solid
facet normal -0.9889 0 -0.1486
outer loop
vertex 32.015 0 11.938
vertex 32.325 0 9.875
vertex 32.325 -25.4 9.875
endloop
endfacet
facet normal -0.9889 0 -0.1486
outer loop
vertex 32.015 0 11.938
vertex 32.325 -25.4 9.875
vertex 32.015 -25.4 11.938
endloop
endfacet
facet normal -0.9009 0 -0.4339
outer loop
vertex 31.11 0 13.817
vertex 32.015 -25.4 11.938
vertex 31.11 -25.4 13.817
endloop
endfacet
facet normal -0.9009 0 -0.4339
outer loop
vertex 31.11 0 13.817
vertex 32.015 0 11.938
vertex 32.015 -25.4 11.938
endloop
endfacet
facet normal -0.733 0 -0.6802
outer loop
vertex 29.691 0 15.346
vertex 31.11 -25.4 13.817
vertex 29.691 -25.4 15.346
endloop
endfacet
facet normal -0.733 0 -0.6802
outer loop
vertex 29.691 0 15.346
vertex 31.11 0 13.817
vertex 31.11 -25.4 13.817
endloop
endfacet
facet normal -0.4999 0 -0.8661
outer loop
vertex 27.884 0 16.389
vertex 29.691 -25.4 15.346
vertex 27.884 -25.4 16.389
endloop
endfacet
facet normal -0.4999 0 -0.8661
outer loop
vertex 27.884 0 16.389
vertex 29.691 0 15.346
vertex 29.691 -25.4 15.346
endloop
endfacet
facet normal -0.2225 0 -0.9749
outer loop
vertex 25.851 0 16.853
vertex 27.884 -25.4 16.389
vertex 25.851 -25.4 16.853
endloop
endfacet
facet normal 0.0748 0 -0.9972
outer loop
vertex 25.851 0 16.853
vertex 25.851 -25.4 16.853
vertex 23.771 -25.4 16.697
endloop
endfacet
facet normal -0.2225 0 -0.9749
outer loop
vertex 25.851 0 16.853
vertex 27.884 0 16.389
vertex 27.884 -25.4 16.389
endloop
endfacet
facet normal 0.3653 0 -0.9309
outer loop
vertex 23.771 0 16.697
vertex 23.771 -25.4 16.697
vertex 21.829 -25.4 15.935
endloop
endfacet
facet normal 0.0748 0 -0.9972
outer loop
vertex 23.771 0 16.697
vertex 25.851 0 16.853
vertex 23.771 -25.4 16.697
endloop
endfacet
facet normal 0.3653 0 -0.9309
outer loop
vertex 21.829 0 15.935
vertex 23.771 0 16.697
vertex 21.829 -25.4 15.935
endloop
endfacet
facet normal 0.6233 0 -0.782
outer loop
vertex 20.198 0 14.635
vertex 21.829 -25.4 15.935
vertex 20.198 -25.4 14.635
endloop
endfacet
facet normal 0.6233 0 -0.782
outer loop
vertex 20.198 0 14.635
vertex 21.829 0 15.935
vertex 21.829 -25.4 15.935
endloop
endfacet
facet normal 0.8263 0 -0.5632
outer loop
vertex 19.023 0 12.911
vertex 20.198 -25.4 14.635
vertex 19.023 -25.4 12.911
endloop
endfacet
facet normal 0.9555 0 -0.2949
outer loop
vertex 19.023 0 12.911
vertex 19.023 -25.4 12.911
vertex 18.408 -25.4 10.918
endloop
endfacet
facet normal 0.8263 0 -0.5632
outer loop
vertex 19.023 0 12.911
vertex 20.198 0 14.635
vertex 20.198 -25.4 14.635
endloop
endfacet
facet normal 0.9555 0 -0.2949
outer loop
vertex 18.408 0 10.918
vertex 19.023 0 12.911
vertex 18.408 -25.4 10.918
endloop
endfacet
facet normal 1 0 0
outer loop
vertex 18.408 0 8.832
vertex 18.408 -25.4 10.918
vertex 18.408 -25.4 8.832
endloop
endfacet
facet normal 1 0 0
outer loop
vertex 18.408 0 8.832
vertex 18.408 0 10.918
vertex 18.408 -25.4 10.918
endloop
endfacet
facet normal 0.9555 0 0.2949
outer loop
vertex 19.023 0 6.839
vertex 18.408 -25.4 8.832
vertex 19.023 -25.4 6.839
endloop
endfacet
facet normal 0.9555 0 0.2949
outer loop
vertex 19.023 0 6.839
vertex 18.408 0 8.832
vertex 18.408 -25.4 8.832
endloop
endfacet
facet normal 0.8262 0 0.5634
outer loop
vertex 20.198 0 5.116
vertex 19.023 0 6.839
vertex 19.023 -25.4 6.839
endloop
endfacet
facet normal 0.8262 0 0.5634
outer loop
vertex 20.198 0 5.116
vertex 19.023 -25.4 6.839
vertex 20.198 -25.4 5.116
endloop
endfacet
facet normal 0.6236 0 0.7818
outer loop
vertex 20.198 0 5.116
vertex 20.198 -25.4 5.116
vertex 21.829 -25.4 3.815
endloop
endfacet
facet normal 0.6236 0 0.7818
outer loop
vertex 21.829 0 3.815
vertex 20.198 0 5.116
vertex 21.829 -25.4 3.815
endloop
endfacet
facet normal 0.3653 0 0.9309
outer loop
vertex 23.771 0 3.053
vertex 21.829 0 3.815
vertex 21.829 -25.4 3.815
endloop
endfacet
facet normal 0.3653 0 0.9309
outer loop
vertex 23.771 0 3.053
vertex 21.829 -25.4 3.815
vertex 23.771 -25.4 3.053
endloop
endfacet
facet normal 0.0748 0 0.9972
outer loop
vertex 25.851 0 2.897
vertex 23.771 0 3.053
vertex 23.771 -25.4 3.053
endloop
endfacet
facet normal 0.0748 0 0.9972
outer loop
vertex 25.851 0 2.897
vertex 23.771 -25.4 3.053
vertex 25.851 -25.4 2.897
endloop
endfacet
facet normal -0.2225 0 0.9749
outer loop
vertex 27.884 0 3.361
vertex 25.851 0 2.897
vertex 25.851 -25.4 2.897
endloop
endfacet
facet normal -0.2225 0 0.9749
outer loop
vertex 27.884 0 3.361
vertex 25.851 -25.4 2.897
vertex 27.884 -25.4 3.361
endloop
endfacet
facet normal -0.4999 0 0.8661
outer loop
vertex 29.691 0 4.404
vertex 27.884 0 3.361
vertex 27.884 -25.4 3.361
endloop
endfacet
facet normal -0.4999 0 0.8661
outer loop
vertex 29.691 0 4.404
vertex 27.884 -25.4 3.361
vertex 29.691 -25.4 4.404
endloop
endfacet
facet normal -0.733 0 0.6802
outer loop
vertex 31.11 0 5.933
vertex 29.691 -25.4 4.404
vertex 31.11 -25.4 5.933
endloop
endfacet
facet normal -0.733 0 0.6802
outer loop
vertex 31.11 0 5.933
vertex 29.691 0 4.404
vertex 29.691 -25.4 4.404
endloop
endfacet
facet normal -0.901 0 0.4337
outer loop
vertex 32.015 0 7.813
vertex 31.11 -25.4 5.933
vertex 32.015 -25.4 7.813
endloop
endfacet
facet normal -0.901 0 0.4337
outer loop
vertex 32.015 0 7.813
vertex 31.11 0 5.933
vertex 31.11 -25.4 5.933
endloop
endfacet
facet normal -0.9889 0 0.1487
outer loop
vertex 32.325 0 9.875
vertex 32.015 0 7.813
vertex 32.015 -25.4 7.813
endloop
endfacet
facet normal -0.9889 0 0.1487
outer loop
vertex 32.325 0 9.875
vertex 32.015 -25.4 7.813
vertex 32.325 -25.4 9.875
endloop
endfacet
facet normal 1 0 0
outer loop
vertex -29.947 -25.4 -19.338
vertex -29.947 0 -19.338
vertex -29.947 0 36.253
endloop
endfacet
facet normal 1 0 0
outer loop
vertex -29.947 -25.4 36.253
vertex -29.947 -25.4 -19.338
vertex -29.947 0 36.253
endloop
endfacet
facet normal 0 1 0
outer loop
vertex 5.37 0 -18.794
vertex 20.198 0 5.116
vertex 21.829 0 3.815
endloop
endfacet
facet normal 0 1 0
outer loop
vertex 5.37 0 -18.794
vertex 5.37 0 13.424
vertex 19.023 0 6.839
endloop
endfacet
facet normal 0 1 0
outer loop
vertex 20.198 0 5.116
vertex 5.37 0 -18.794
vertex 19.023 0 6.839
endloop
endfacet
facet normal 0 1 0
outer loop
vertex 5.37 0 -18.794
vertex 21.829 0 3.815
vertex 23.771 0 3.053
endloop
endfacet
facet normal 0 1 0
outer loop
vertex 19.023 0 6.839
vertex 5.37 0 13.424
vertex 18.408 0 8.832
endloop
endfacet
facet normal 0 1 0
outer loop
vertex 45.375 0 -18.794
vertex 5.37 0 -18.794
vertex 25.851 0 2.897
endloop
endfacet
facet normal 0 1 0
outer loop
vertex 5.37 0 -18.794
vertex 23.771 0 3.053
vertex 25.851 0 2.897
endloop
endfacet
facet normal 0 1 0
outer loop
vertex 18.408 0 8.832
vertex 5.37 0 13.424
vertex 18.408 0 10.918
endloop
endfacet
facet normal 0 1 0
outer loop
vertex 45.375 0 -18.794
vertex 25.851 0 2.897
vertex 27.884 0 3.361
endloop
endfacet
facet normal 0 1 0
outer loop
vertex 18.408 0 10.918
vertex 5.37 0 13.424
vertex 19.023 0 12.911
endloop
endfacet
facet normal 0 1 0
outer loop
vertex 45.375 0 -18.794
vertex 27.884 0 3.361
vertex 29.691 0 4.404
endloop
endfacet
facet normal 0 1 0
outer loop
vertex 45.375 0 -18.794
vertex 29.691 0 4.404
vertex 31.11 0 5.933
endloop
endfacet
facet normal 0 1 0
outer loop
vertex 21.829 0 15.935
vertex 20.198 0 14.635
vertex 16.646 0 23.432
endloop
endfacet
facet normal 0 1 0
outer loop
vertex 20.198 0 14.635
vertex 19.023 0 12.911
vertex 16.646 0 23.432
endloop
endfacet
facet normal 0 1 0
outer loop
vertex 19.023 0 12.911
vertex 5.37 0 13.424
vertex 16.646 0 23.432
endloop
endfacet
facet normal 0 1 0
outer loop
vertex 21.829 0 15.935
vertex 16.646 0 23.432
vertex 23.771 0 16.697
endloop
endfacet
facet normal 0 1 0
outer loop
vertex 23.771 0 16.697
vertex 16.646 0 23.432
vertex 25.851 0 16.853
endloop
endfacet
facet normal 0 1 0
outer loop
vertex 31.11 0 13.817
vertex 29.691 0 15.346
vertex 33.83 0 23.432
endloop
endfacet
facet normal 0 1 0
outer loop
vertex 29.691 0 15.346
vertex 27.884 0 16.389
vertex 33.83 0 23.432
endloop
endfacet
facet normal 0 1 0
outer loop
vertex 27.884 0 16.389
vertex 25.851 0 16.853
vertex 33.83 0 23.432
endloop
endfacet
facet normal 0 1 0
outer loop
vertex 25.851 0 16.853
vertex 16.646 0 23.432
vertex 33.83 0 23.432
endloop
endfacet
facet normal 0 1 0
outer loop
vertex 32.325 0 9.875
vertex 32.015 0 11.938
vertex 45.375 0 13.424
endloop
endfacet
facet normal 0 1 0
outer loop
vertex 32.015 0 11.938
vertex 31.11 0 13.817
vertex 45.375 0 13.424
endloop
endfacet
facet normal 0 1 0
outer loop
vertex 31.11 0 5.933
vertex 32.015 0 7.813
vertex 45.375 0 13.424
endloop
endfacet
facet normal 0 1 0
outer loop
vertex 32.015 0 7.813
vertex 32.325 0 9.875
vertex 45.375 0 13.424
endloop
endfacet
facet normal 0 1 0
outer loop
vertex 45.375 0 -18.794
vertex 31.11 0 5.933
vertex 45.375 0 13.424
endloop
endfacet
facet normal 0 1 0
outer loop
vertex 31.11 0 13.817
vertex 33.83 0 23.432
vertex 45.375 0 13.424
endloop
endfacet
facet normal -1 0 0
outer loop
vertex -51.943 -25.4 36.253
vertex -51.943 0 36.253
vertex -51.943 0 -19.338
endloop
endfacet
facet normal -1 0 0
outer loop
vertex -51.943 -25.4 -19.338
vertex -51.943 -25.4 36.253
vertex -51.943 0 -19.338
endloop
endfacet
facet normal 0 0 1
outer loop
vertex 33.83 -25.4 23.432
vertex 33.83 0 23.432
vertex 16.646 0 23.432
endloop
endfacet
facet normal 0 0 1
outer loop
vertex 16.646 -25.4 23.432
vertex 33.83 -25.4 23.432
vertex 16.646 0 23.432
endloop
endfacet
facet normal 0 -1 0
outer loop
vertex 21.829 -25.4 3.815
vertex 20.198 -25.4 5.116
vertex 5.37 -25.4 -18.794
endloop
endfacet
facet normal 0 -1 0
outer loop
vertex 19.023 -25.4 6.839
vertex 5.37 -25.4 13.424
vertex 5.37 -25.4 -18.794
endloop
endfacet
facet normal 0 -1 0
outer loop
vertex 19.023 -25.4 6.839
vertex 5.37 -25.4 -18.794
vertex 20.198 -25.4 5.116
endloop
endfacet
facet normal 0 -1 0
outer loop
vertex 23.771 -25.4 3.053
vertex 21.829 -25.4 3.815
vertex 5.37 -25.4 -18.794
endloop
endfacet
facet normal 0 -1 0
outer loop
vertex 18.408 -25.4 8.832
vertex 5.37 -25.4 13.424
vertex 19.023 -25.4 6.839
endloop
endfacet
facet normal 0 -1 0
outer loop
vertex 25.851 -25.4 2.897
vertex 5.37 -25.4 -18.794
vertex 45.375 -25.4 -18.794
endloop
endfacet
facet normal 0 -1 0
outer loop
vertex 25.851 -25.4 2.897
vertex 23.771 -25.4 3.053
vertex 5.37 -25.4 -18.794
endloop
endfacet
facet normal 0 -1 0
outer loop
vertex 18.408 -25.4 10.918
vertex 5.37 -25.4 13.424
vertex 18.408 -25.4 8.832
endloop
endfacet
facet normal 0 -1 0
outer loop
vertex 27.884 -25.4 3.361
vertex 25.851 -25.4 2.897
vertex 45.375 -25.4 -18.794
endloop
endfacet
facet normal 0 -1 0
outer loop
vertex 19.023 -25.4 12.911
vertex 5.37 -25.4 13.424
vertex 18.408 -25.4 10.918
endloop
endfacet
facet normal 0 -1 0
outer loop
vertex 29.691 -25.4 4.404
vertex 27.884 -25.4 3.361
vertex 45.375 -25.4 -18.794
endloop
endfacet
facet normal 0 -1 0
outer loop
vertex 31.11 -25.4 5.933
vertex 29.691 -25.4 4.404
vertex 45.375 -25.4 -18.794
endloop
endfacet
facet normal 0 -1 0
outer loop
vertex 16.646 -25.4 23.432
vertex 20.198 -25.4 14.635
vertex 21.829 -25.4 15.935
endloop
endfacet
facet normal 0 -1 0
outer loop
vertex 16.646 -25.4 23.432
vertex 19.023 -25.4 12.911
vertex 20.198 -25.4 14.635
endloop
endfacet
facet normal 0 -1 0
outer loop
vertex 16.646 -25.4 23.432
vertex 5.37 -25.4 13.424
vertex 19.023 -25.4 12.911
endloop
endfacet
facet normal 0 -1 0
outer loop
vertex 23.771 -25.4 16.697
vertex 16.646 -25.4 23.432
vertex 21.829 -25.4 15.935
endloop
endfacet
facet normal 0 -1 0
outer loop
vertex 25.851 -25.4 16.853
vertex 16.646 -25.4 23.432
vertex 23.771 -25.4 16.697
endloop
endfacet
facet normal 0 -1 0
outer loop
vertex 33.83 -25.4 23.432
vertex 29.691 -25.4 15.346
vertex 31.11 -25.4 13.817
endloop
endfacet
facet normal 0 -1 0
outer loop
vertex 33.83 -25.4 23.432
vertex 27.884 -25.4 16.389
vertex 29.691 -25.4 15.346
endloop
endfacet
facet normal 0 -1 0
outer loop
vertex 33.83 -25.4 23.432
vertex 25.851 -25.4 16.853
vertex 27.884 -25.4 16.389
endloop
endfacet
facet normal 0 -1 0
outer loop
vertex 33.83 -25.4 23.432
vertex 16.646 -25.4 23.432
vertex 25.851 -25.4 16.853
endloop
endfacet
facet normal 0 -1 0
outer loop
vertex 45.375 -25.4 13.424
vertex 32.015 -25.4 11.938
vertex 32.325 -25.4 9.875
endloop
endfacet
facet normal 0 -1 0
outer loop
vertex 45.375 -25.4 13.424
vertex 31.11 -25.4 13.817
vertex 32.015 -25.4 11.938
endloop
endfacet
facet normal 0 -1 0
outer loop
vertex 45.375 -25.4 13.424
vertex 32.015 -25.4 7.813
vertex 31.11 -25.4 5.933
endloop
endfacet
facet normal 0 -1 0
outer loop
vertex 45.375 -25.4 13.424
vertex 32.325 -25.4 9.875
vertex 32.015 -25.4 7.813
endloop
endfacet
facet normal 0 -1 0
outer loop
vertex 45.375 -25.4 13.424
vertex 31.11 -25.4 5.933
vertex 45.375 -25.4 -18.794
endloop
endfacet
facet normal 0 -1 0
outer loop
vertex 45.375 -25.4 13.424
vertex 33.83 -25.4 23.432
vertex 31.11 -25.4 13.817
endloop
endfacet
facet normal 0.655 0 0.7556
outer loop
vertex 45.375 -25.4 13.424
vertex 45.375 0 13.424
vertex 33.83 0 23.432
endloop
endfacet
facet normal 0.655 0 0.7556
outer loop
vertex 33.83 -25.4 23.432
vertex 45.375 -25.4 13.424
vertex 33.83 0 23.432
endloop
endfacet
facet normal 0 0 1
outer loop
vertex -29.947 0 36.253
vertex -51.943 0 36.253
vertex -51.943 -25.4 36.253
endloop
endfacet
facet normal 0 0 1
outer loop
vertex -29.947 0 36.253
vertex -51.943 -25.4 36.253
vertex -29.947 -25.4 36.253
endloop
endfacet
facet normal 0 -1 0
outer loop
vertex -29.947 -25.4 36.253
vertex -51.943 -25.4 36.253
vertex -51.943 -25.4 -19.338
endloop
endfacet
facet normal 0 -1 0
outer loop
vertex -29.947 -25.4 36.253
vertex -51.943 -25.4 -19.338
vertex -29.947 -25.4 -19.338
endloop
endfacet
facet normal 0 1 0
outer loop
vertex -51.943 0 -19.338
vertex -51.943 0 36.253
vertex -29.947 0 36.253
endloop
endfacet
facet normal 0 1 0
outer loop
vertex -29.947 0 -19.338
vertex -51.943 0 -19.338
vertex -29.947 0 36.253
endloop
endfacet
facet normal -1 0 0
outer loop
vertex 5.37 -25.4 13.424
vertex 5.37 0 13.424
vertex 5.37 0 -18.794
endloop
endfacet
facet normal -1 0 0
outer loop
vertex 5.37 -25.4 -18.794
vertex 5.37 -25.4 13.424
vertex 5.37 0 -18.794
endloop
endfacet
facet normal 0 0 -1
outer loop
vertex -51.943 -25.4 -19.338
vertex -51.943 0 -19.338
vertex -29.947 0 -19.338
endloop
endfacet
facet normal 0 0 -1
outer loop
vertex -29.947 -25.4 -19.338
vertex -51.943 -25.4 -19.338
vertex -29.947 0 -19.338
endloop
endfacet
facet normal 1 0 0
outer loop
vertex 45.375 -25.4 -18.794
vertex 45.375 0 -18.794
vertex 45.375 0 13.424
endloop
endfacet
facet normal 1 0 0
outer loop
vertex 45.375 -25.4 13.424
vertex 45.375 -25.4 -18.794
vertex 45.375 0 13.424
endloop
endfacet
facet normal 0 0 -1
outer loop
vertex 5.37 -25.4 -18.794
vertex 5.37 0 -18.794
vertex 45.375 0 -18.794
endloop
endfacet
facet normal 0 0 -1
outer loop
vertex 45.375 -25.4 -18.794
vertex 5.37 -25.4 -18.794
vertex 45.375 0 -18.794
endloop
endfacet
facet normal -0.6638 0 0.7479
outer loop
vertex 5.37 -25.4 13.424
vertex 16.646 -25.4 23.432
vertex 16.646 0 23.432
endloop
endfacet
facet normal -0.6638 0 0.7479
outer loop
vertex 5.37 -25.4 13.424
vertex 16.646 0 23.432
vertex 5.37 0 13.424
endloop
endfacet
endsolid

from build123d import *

# Parameters (mm, degrees)
F0_W     = 21.9964
F0_H     = 11.283317
F0_H_2   = 44.307585
F0_R     = 6.9977
F1_DEPTH = 25.4


with BuildPart() as f1:
    # F0 (on Front) → F1 (new body)
    with BuildSketch(Plane.XZ):
        with Locations((-40.944714, 30.611225)):
            Rectangle(F0_W, F0_H)
        with Locations((-40.944714, 2.815774)):
            Rectangle(F0_W, F0_H_2)
        Polygon((5.3698, 13.424497), (5.3698, -18.794296), (45.3748, -18.794296), (45.3748, 13.424497), (33.829734, 23.432097), (16.646376, 23.432097), align=None)
        with Locations((25.327743, 9.875216)):
            Circle(F0_R, mode=Mode.SUBTRACT)
    extrude(amount=F1_DEPTH)


solid = f1.part
